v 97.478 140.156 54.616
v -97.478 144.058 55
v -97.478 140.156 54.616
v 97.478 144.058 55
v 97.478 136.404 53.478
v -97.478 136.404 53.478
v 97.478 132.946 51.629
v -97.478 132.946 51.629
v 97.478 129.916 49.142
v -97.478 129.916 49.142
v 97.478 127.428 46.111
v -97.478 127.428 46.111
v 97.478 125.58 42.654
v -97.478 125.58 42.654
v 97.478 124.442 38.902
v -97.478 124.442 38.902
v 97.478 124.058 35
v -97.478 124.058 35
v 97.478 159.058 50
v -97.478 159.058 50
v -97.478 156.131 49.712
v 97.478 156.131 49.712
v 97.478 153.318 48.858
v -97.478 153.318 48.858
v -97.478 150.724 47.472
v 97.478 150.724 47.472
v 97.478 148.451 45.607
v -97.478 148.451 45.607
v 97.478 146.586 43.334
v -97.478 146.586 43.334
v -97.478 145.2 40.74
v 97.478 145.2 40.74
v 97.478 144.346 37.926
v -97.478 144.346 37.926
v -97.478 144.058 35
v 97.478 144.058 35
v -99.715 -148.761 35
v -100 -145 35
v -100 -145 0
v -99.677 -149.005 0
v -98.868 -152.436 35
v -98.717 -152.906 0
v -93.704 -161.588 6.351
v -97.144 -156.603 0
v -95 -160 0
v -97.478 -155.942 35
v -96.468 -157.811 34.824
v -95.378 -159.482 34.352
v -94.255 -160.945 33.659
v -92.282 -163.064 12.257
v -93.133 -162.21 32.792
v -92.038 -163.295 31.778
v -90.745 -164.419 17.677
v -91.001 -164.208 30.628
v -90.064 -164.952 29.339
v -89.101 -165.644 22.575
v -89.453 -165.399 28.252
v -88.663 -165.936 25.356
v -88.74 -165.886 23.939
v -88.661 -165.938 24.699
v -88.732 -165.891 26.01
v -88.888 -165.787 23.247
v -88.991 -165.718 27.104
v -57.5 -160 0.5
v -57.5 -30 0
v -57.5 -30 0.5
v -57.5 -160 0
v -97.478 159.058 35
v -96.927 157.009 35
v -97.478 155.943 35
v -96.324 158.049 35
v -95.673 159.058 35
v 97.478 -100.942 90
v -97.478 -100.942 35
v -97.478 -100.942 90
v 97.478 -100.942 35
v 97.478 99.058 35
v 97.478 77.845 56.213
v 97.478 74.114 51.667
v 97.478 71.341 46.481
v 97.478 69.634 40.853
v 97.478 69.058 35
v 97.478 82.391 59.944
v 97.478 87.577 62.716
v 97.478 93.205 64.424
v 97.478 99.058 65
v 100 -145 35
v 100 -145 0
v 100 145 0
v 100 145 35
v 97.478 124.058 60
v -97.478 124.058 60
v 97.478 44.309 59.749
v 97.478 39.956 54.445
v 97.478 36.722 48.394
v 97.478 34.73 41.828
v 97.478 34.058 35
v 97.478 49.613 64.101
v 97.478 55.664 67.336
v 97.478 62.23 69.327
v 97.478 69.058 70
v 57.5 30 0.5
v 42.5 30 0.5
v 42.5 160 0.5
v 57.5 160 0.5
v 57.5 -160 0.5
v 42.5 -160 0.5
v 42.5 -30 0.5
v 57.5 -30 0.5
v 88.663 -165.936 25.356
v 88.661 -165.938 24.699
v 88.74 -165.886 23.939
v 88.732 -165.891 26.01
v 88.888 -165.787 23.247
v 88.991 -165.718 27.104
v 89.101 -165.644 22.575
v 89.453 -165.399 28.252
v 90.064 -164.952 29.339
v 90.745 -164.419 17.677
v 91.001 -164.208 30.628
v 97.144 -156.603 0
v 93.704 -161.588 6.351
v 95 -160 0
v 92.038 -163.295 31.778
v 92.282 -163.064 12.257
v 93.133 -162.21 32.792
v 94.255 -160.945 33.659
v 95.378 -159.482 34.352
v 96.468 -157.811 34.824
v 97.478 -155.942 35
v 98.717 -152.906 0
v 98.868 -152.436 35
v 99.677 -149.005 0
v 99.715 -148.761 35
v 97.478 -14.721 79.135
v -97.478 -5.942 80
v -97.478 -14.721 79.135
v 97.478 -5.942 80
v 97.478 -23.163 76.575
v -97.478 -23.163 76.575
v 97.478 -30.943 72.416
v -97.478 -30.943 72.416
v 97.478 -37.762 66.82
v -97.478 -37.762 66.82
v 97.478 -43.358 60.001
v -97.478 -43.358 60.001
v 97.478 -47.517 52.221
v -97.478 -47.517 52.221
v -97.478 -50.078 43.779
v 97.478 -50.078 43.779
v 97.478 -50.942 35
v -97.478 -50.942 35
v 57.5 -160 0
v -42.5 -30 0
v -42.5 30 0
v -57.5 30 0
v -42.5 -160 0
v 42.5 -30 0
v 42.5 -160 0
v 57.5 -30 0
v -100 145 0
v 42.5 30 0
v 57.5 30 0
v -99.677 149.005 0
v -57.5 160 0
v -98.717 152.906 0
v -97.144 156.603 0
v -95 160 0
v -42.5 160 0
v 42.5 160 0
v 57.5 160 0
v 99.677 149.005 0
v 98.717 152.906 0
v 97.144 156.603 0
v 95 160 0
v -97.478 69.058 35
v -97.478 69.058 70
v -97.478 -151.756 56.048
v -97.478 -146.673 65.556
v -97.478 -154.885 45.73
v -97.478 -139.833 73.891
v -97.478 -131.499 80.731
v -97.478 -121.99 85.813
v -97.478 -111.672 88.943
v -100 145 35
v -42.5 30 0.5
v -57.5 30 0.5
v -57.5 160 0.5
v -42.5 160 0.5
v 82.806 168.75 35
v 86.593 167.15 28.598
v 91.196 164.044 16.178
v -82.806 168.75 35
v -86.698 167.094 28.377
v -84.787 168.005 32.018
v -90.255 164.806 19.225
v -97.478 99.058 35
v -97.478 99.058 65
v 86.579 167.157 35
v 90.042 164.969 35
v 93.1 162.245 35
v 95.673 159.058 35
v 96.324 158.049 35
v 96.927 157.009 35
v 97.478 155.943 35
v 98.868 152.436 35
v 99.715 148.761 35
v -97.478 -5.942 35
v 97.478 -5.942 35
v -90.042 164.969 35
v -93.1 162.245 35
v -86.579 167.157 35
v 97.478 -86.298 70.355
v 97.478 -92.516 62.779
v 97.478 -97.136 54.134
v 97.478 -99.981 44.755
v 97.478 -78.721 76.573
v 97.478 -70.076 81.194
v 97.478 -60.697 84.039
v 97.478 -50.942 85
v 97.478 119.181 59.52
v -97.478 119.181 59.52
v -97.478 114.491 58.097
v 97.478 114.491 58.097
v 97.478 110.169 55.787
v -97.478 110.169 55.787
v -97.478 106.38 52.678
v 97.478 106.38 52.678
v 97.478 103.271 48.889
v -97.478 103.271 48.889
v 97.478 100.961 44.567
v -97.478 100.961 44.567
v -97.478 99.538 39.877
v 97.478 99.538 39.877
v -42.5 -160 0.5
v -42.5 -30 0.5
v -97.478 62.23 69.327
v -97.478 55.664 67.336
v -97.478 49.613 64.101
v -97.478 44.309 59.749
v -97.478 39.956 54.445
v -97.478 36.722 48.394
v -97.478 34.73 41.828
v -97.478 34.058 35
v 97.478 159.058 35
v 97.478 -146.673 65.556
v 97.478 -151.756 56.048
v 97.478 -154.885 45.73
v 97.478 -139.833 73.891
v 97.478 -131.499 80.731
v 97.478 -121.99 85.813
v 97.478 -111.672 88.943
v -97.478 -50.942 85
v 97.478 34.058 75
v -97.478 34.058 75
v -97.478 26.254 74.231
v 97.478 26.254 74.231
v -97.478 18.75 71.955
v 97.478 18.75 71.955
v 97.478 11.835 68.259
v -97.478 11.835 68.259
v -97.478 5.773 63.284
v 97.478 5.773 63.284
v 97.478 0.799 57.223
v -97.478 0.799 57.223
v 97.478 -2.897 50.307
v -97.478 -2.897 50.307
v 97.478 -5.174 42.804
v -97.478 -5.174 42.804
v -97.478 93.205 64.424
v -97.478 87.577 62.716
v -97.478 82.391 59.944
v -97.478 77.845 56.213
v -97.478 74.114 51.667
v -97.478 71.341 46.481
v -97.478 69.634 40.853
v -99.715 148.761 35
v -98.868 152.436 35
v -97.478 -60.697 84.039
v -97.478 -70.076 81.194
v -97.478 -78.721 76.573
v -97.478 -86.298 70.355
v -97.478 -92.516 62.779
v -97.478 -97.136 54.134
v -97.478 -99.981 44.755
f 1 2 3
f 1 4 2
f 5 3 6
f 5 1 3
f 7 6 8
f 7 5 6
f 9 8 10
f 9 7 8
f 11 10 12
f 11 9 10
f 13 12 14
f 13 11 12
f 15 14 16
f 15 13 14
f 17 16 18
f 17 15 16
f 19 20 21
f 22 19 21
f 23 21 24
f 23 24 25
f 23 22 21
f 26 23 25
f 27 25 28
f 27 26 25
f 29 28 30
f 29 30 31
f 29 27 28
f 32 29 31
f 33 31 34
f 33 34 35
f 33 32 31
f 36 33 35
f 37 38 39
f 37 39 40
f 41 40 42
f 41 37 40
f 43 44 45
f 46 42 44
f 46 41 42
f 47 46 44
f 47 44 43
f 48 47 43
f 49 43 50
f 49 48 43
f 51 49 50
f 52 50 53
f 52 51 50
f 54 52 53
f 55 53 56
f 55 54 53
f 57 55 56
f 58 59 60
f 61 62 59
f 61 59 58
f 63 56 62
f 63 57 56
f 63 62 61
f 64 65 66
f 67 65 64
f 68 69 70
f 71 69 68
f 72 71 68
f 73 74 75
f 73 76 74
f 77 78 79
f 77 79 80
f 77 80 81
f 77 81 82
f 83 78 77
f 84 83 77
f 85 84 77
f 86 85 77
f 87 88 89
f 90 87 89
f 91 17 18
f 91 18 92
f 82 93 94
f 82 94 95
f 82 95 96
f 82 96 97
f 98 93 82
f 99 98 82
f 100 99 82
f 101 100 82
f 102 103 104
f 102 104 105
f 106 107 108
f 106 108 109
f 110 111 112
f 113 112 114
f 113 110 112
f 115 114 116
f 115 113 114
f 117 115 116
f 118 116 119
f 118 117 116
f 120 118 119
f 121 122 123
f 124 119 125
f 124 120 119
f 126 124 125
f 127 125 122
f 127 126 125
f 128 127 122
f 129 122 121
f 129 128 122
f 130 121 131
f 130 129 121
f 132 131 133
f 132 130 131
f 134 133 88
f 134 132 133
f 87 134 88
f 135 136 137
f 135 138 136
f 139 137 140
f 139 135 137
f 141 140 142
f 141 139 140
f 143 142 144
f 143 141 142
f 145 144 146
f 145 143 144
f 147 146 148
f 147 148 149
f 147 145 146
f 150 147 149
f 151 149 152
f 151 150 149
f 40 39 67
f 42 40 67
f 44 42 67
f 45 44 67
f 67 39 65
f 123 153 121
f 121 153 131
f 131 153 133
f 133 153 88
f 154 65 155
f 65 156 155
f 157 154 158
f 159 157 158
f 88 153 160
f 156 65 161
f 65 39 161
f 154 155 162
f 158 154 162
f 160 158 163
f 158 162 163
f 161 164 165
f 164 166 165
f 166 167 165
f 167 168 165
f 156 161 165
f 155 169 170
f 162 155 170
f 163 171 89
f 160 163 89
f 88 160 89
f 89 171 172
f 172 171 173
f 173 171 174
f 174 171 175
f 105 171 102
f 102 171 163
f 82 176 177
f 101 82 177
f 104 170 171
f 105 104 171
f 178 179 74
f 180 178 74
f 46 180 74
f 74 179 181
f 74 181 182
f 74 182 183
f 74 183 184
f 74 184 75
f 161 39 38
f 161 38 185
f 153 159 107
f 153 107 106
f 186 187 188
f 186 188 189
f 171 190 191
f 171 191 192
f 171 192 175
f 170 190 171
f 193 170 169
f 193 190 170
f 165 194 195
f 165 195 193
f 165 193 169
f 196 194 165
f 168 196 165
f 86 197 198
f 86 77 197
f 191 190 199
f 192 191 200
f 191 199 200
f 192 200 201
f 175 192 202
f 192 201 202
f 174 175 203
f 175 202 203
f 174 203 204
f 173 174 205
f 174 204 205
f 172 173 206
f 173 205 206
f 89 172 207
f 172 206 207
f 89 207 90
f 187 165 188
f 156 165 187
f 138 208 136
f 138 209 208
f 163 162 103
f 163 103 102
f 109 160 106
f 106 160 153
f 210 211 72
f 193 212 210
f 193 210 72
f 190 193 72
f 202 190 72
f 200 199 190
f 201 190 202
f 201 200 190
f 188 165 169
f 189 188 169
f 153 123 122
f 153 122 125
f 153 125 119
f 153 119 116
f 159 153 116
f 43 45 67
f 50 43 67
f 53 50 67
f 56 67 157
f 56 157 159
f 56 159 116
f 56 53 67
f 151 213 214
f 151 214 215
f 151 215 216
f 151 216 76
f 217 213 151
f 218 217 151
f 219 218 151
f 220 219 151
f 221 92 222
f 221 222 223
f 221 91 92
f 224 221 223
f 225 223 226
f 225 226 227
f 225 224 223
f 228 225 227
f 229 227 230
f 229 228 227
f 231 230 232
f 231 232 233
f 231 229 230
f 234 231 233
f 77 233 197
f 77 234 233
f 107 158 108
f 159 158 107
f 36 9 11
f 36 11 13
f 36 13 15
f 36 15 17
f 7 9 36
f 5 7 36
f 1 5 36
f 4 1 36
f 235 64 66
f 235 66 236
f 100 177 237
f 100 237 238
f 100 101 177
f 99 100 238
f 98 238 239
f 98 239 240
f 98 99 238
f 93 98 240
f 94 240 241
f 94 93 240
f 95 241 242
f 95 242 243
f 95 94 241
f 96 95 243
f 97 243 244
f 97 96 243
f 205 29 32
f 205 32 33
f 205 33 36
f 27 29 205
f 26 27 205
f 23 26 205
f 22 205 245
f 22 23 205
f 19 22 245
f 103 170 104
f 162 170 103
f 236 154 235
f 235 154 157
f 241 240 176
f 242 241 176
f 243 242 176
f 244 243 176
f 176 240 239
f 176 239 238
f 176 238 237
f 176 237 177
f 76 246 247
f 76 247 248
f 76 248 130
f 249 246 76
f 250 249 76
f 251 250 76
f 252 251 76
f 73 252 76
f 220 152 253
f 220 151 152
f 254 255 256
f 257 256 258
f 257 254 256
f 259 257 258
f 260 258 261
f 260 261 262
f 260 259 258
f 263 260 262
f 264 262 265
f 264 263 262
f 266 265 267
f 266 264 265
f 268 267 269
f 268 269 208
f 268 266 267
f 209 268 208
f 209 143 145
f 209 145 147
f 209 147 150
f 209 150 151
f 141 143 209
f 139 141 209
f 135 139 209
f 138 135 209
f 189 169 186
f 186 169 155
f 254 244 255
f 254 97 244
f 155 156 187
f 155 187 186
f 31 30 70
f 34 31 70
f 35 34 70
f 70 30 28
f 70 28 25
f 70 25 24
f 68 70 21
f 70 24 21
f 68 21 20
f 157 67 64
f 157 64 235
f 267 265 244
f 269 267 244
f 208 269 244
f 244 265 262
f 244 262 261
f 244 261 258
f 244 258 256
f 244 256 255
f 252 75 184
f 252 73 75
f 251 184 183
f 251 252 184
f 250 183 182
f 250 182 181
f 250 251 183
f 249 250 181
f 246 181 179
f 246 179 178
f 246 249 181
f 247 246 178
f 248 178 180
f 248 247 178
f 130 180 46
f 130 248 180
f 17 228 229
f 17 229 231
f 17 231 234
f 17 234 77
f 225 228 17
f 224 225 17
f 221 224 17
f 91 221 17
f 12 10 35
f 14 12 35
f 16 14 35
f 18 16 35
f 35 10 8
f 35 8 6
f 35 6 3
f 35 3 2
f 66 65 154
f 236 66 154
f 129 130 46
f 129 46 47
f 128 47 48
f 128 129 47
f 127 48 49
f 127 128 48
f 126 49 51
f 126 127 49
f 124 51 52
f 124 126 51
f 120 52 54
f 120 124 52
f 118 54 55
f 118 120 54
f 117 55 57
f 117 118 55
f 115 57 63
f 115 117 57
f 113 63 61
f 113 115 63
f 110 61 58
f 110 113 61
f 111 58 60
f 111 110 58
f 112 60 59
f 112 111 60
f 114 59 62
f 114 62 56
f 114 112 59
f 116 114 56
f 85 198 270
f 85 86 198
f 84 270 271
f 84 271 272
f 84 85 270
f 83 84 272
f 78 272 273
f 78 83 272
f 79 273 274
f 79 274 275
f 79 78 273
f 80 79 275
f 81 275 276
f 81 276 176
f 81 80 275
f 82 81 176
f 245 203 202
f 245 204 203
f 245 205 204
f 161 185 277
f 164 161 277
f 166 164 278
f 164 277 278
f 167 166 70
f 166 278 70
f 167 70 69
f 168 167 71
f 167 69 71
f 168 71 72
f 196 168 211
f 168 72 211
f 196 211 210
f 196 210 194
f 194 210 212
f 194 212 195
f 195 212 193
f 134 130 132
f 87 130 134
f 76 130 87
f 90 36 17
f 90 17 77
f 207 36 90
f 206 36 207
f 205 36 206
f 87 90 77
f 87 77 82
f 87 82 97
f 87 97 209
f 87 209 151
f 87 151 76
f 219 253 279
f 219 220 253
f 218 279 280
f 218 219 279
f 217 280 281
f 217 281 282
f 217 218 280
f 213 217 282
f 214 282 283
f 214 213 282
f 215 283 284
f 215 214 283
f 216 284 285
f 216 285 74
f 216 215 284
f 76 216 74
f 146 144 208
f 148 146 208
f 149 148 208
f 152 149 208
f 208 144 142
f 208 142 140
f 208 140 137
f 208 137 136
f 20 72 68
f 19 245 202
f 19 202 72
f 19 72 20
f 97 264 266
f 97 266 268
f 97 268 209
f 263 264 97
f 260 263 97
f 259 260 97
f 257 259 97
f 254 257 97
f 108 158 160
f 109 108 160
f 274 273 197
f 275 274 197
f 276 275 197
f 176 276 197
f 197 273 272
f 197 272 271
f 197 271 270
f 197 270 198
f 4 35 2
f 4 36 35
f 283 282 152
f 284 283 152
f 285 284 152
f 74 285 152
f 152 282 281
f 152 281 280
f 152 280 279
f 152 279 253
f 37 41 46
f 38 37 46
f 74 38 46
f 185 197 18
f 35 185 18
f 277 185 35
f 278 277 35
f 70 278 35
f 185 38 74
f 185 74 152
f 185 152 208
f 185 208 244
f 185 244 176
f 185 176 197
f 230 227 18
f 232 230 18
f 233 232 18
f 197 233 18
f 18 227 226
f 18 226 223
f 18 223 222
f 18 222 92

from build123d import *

# Parameters (mm, degrees)
F0_W        = 200
F0_H        = 340
F1_DEPTH    = 35
F2_W        = 15
F2_H        = 130
F3_DEPTH    = 0.5
F4_R        = 25
F5_T1_DEPTH = 357.7701999818
F6_R        = 10
F8_DEPTH    = 97.478


# Not quite as in the source:
# - a fillet or chamfer that OpenCascade refuses, or shapes differently, is made with other operations: its cross-section is extruded or revolved along the edge and cut away or added


with BuildPart() as f1:
    # F0 (on Top) → F1 (new body)
    with BuildSketch(Plane.XY):
        Rectangle(F0_W, F0_H)
    extrude(amount=F1_DEPTH)

    # F2 (on face) → F3 (cut)
    with BuildSketch(Plane(origin=(0, 0, 0), x_dir=(1, 0, 0), z_dir=(0, 0, -1))):
        with Locations((-50, 95)):
            Rectangle(F2_W, F2_H)
        with Locations((50, 95)):
            Rectangle(F2_W, F2_H)
        with Locations((-50, -95)):
            Rectangle(F2_W, F2_H)
        with Locations((50, -95)):
            Rectangle(F2_W, F2_H)
    extrude(amount=-F3_DEPTH, mode=Mode.SUBTRACT)

    # F4
    f4_edges = [f1.edges().sort_by_distance(p)[0] for p in [
        (100, -170, 17.5),
        (-100, -170, 17.5),
        (100, 170, 17.5),
        (-100, 170, 17.5),
    ]]
    fillet(f4_edges, radius=F4_R)

    # F5: chamfer of 40 x 10 on 2 edges, made by hand

    # F5_s2 → F5_t1 (cut)
    with BuildSketch(Plane.YZ.offset(-178.8850999909)):
        Polygon((-160, 0), (-170, 40), (-170, 0), align=None)
        Polygon((170, 40), (160, 0), (170, 0), align=None)
    extrude(amount=F5_T1_DEPTH, mode=Mode.SUBTRACT)

    # F6
    f6_edges = [f1.edges().sort_by_distance(p)[0] for p in [
        (0, -168.75, 35),
    ]]
    fillet(f6_edges, radius=F6_R)

    # F7 (on Right) → F8 (join, symmetric)
    with BuildSketch(Plane.YZ):
        with BuildLine():
            Line((-155.942235936, 35), (-100.942235936, 35))
            Line((-100.942235936, 35), (-100.942235936, 90))
            ThreePointArc((-100.942235936, 90), (-139.8331089012, 73.8908729653), (-155.942235936, 35))
        make_face()
        with BuildLine():
            ThreePointArc((-50.942235936, 85), (-86.2975749953, 70.3553390593), (-100.942235936, 35))
            Line((-100.942235936, 35), (-50.942235936, 35))
            Line((-50.942235936, 35), (-50.942235936, 85))
        make_face()
        with BuildLine():
            ThreePointArc((-5.942235936, 80), (-37.7620410894, 66.8198051534), (-50.942235936, 35))
            Line((-50.942235936, 35), (-5.942235936, 35))
            Line((-5.942235936, 35), (-5.942235936, 75))
            Line((-5.942235936, 75), (-5.942235936, 80))
        make_face()
        with BuildLine():
            ThreePointArc((159.057764064, 50), (148.4511623462, 45.6066017178), (144.057764064, 35))
            Line((144.057764064, 35), (159.057764064, 35))
            Line((159.057764064, 35), (159.057764064, 50))
        make_face()
        with BuildLine():
            ThreePointArc((34.057764064, 75), (5.7734928166, 63.2842712475), (-5.942235936, 35))
            Line((-5.942235936, 35), (34.057764064, 35))
            Line((34.057764064, 35), (34.057764064, 70))
            Line((34.057764064, 70), (34.057764064, 75))
        make_face()
        with BuildLine():
            ThreePointArc((69.057764064, 70), (44.3090267225, 59.7487373415), (34.057764064, 35))
            Line((34.057764064, 35), (69.057764064, 35))
            Line((69.057764064, 35), (69.057764064, 65))
            Line((69.057764064, 65), (69.057764064, 70))
        make_face()
        with BuildLine():
            ThreePointArc((99.057764064, 65), (77.8445606284, 56.2132034356), (69.057764064, 35))
            Line((69.057764064, 35), (99.057764064, 35))
            Line((99.057764064, 35), (99.057764064, 60))
            Line((99.057764064, 60), (99.057764064, 65))
        make_face()
        with BuildLine():
            ThreePointArc((124.057764064, 60), (106.3800945344, 52.6776695297), (99.057764064, 35))
            Line((99.057764064, 35), (124.057764064, 35))
            Line((124.057764064, 35), (124.057764064, 55))
            Line((124.057764064, 55), (124.057764064, 60))
        make_face()
        with BuildLine():
            ThreePointArc((144.057764064, 55), (129.9156284403, 49.1421356237), (124.057764064, 35))
            Line((124.057764064, 35), (144.057764064, 35))
            Line((144.057764064, 35), (144.057764064, 50))
            Line((144.057764064, 50), (144.057764064, 55))
        make_face()
    extrude(amount=F8_DEPTH, both=True)


solid = f1.part
